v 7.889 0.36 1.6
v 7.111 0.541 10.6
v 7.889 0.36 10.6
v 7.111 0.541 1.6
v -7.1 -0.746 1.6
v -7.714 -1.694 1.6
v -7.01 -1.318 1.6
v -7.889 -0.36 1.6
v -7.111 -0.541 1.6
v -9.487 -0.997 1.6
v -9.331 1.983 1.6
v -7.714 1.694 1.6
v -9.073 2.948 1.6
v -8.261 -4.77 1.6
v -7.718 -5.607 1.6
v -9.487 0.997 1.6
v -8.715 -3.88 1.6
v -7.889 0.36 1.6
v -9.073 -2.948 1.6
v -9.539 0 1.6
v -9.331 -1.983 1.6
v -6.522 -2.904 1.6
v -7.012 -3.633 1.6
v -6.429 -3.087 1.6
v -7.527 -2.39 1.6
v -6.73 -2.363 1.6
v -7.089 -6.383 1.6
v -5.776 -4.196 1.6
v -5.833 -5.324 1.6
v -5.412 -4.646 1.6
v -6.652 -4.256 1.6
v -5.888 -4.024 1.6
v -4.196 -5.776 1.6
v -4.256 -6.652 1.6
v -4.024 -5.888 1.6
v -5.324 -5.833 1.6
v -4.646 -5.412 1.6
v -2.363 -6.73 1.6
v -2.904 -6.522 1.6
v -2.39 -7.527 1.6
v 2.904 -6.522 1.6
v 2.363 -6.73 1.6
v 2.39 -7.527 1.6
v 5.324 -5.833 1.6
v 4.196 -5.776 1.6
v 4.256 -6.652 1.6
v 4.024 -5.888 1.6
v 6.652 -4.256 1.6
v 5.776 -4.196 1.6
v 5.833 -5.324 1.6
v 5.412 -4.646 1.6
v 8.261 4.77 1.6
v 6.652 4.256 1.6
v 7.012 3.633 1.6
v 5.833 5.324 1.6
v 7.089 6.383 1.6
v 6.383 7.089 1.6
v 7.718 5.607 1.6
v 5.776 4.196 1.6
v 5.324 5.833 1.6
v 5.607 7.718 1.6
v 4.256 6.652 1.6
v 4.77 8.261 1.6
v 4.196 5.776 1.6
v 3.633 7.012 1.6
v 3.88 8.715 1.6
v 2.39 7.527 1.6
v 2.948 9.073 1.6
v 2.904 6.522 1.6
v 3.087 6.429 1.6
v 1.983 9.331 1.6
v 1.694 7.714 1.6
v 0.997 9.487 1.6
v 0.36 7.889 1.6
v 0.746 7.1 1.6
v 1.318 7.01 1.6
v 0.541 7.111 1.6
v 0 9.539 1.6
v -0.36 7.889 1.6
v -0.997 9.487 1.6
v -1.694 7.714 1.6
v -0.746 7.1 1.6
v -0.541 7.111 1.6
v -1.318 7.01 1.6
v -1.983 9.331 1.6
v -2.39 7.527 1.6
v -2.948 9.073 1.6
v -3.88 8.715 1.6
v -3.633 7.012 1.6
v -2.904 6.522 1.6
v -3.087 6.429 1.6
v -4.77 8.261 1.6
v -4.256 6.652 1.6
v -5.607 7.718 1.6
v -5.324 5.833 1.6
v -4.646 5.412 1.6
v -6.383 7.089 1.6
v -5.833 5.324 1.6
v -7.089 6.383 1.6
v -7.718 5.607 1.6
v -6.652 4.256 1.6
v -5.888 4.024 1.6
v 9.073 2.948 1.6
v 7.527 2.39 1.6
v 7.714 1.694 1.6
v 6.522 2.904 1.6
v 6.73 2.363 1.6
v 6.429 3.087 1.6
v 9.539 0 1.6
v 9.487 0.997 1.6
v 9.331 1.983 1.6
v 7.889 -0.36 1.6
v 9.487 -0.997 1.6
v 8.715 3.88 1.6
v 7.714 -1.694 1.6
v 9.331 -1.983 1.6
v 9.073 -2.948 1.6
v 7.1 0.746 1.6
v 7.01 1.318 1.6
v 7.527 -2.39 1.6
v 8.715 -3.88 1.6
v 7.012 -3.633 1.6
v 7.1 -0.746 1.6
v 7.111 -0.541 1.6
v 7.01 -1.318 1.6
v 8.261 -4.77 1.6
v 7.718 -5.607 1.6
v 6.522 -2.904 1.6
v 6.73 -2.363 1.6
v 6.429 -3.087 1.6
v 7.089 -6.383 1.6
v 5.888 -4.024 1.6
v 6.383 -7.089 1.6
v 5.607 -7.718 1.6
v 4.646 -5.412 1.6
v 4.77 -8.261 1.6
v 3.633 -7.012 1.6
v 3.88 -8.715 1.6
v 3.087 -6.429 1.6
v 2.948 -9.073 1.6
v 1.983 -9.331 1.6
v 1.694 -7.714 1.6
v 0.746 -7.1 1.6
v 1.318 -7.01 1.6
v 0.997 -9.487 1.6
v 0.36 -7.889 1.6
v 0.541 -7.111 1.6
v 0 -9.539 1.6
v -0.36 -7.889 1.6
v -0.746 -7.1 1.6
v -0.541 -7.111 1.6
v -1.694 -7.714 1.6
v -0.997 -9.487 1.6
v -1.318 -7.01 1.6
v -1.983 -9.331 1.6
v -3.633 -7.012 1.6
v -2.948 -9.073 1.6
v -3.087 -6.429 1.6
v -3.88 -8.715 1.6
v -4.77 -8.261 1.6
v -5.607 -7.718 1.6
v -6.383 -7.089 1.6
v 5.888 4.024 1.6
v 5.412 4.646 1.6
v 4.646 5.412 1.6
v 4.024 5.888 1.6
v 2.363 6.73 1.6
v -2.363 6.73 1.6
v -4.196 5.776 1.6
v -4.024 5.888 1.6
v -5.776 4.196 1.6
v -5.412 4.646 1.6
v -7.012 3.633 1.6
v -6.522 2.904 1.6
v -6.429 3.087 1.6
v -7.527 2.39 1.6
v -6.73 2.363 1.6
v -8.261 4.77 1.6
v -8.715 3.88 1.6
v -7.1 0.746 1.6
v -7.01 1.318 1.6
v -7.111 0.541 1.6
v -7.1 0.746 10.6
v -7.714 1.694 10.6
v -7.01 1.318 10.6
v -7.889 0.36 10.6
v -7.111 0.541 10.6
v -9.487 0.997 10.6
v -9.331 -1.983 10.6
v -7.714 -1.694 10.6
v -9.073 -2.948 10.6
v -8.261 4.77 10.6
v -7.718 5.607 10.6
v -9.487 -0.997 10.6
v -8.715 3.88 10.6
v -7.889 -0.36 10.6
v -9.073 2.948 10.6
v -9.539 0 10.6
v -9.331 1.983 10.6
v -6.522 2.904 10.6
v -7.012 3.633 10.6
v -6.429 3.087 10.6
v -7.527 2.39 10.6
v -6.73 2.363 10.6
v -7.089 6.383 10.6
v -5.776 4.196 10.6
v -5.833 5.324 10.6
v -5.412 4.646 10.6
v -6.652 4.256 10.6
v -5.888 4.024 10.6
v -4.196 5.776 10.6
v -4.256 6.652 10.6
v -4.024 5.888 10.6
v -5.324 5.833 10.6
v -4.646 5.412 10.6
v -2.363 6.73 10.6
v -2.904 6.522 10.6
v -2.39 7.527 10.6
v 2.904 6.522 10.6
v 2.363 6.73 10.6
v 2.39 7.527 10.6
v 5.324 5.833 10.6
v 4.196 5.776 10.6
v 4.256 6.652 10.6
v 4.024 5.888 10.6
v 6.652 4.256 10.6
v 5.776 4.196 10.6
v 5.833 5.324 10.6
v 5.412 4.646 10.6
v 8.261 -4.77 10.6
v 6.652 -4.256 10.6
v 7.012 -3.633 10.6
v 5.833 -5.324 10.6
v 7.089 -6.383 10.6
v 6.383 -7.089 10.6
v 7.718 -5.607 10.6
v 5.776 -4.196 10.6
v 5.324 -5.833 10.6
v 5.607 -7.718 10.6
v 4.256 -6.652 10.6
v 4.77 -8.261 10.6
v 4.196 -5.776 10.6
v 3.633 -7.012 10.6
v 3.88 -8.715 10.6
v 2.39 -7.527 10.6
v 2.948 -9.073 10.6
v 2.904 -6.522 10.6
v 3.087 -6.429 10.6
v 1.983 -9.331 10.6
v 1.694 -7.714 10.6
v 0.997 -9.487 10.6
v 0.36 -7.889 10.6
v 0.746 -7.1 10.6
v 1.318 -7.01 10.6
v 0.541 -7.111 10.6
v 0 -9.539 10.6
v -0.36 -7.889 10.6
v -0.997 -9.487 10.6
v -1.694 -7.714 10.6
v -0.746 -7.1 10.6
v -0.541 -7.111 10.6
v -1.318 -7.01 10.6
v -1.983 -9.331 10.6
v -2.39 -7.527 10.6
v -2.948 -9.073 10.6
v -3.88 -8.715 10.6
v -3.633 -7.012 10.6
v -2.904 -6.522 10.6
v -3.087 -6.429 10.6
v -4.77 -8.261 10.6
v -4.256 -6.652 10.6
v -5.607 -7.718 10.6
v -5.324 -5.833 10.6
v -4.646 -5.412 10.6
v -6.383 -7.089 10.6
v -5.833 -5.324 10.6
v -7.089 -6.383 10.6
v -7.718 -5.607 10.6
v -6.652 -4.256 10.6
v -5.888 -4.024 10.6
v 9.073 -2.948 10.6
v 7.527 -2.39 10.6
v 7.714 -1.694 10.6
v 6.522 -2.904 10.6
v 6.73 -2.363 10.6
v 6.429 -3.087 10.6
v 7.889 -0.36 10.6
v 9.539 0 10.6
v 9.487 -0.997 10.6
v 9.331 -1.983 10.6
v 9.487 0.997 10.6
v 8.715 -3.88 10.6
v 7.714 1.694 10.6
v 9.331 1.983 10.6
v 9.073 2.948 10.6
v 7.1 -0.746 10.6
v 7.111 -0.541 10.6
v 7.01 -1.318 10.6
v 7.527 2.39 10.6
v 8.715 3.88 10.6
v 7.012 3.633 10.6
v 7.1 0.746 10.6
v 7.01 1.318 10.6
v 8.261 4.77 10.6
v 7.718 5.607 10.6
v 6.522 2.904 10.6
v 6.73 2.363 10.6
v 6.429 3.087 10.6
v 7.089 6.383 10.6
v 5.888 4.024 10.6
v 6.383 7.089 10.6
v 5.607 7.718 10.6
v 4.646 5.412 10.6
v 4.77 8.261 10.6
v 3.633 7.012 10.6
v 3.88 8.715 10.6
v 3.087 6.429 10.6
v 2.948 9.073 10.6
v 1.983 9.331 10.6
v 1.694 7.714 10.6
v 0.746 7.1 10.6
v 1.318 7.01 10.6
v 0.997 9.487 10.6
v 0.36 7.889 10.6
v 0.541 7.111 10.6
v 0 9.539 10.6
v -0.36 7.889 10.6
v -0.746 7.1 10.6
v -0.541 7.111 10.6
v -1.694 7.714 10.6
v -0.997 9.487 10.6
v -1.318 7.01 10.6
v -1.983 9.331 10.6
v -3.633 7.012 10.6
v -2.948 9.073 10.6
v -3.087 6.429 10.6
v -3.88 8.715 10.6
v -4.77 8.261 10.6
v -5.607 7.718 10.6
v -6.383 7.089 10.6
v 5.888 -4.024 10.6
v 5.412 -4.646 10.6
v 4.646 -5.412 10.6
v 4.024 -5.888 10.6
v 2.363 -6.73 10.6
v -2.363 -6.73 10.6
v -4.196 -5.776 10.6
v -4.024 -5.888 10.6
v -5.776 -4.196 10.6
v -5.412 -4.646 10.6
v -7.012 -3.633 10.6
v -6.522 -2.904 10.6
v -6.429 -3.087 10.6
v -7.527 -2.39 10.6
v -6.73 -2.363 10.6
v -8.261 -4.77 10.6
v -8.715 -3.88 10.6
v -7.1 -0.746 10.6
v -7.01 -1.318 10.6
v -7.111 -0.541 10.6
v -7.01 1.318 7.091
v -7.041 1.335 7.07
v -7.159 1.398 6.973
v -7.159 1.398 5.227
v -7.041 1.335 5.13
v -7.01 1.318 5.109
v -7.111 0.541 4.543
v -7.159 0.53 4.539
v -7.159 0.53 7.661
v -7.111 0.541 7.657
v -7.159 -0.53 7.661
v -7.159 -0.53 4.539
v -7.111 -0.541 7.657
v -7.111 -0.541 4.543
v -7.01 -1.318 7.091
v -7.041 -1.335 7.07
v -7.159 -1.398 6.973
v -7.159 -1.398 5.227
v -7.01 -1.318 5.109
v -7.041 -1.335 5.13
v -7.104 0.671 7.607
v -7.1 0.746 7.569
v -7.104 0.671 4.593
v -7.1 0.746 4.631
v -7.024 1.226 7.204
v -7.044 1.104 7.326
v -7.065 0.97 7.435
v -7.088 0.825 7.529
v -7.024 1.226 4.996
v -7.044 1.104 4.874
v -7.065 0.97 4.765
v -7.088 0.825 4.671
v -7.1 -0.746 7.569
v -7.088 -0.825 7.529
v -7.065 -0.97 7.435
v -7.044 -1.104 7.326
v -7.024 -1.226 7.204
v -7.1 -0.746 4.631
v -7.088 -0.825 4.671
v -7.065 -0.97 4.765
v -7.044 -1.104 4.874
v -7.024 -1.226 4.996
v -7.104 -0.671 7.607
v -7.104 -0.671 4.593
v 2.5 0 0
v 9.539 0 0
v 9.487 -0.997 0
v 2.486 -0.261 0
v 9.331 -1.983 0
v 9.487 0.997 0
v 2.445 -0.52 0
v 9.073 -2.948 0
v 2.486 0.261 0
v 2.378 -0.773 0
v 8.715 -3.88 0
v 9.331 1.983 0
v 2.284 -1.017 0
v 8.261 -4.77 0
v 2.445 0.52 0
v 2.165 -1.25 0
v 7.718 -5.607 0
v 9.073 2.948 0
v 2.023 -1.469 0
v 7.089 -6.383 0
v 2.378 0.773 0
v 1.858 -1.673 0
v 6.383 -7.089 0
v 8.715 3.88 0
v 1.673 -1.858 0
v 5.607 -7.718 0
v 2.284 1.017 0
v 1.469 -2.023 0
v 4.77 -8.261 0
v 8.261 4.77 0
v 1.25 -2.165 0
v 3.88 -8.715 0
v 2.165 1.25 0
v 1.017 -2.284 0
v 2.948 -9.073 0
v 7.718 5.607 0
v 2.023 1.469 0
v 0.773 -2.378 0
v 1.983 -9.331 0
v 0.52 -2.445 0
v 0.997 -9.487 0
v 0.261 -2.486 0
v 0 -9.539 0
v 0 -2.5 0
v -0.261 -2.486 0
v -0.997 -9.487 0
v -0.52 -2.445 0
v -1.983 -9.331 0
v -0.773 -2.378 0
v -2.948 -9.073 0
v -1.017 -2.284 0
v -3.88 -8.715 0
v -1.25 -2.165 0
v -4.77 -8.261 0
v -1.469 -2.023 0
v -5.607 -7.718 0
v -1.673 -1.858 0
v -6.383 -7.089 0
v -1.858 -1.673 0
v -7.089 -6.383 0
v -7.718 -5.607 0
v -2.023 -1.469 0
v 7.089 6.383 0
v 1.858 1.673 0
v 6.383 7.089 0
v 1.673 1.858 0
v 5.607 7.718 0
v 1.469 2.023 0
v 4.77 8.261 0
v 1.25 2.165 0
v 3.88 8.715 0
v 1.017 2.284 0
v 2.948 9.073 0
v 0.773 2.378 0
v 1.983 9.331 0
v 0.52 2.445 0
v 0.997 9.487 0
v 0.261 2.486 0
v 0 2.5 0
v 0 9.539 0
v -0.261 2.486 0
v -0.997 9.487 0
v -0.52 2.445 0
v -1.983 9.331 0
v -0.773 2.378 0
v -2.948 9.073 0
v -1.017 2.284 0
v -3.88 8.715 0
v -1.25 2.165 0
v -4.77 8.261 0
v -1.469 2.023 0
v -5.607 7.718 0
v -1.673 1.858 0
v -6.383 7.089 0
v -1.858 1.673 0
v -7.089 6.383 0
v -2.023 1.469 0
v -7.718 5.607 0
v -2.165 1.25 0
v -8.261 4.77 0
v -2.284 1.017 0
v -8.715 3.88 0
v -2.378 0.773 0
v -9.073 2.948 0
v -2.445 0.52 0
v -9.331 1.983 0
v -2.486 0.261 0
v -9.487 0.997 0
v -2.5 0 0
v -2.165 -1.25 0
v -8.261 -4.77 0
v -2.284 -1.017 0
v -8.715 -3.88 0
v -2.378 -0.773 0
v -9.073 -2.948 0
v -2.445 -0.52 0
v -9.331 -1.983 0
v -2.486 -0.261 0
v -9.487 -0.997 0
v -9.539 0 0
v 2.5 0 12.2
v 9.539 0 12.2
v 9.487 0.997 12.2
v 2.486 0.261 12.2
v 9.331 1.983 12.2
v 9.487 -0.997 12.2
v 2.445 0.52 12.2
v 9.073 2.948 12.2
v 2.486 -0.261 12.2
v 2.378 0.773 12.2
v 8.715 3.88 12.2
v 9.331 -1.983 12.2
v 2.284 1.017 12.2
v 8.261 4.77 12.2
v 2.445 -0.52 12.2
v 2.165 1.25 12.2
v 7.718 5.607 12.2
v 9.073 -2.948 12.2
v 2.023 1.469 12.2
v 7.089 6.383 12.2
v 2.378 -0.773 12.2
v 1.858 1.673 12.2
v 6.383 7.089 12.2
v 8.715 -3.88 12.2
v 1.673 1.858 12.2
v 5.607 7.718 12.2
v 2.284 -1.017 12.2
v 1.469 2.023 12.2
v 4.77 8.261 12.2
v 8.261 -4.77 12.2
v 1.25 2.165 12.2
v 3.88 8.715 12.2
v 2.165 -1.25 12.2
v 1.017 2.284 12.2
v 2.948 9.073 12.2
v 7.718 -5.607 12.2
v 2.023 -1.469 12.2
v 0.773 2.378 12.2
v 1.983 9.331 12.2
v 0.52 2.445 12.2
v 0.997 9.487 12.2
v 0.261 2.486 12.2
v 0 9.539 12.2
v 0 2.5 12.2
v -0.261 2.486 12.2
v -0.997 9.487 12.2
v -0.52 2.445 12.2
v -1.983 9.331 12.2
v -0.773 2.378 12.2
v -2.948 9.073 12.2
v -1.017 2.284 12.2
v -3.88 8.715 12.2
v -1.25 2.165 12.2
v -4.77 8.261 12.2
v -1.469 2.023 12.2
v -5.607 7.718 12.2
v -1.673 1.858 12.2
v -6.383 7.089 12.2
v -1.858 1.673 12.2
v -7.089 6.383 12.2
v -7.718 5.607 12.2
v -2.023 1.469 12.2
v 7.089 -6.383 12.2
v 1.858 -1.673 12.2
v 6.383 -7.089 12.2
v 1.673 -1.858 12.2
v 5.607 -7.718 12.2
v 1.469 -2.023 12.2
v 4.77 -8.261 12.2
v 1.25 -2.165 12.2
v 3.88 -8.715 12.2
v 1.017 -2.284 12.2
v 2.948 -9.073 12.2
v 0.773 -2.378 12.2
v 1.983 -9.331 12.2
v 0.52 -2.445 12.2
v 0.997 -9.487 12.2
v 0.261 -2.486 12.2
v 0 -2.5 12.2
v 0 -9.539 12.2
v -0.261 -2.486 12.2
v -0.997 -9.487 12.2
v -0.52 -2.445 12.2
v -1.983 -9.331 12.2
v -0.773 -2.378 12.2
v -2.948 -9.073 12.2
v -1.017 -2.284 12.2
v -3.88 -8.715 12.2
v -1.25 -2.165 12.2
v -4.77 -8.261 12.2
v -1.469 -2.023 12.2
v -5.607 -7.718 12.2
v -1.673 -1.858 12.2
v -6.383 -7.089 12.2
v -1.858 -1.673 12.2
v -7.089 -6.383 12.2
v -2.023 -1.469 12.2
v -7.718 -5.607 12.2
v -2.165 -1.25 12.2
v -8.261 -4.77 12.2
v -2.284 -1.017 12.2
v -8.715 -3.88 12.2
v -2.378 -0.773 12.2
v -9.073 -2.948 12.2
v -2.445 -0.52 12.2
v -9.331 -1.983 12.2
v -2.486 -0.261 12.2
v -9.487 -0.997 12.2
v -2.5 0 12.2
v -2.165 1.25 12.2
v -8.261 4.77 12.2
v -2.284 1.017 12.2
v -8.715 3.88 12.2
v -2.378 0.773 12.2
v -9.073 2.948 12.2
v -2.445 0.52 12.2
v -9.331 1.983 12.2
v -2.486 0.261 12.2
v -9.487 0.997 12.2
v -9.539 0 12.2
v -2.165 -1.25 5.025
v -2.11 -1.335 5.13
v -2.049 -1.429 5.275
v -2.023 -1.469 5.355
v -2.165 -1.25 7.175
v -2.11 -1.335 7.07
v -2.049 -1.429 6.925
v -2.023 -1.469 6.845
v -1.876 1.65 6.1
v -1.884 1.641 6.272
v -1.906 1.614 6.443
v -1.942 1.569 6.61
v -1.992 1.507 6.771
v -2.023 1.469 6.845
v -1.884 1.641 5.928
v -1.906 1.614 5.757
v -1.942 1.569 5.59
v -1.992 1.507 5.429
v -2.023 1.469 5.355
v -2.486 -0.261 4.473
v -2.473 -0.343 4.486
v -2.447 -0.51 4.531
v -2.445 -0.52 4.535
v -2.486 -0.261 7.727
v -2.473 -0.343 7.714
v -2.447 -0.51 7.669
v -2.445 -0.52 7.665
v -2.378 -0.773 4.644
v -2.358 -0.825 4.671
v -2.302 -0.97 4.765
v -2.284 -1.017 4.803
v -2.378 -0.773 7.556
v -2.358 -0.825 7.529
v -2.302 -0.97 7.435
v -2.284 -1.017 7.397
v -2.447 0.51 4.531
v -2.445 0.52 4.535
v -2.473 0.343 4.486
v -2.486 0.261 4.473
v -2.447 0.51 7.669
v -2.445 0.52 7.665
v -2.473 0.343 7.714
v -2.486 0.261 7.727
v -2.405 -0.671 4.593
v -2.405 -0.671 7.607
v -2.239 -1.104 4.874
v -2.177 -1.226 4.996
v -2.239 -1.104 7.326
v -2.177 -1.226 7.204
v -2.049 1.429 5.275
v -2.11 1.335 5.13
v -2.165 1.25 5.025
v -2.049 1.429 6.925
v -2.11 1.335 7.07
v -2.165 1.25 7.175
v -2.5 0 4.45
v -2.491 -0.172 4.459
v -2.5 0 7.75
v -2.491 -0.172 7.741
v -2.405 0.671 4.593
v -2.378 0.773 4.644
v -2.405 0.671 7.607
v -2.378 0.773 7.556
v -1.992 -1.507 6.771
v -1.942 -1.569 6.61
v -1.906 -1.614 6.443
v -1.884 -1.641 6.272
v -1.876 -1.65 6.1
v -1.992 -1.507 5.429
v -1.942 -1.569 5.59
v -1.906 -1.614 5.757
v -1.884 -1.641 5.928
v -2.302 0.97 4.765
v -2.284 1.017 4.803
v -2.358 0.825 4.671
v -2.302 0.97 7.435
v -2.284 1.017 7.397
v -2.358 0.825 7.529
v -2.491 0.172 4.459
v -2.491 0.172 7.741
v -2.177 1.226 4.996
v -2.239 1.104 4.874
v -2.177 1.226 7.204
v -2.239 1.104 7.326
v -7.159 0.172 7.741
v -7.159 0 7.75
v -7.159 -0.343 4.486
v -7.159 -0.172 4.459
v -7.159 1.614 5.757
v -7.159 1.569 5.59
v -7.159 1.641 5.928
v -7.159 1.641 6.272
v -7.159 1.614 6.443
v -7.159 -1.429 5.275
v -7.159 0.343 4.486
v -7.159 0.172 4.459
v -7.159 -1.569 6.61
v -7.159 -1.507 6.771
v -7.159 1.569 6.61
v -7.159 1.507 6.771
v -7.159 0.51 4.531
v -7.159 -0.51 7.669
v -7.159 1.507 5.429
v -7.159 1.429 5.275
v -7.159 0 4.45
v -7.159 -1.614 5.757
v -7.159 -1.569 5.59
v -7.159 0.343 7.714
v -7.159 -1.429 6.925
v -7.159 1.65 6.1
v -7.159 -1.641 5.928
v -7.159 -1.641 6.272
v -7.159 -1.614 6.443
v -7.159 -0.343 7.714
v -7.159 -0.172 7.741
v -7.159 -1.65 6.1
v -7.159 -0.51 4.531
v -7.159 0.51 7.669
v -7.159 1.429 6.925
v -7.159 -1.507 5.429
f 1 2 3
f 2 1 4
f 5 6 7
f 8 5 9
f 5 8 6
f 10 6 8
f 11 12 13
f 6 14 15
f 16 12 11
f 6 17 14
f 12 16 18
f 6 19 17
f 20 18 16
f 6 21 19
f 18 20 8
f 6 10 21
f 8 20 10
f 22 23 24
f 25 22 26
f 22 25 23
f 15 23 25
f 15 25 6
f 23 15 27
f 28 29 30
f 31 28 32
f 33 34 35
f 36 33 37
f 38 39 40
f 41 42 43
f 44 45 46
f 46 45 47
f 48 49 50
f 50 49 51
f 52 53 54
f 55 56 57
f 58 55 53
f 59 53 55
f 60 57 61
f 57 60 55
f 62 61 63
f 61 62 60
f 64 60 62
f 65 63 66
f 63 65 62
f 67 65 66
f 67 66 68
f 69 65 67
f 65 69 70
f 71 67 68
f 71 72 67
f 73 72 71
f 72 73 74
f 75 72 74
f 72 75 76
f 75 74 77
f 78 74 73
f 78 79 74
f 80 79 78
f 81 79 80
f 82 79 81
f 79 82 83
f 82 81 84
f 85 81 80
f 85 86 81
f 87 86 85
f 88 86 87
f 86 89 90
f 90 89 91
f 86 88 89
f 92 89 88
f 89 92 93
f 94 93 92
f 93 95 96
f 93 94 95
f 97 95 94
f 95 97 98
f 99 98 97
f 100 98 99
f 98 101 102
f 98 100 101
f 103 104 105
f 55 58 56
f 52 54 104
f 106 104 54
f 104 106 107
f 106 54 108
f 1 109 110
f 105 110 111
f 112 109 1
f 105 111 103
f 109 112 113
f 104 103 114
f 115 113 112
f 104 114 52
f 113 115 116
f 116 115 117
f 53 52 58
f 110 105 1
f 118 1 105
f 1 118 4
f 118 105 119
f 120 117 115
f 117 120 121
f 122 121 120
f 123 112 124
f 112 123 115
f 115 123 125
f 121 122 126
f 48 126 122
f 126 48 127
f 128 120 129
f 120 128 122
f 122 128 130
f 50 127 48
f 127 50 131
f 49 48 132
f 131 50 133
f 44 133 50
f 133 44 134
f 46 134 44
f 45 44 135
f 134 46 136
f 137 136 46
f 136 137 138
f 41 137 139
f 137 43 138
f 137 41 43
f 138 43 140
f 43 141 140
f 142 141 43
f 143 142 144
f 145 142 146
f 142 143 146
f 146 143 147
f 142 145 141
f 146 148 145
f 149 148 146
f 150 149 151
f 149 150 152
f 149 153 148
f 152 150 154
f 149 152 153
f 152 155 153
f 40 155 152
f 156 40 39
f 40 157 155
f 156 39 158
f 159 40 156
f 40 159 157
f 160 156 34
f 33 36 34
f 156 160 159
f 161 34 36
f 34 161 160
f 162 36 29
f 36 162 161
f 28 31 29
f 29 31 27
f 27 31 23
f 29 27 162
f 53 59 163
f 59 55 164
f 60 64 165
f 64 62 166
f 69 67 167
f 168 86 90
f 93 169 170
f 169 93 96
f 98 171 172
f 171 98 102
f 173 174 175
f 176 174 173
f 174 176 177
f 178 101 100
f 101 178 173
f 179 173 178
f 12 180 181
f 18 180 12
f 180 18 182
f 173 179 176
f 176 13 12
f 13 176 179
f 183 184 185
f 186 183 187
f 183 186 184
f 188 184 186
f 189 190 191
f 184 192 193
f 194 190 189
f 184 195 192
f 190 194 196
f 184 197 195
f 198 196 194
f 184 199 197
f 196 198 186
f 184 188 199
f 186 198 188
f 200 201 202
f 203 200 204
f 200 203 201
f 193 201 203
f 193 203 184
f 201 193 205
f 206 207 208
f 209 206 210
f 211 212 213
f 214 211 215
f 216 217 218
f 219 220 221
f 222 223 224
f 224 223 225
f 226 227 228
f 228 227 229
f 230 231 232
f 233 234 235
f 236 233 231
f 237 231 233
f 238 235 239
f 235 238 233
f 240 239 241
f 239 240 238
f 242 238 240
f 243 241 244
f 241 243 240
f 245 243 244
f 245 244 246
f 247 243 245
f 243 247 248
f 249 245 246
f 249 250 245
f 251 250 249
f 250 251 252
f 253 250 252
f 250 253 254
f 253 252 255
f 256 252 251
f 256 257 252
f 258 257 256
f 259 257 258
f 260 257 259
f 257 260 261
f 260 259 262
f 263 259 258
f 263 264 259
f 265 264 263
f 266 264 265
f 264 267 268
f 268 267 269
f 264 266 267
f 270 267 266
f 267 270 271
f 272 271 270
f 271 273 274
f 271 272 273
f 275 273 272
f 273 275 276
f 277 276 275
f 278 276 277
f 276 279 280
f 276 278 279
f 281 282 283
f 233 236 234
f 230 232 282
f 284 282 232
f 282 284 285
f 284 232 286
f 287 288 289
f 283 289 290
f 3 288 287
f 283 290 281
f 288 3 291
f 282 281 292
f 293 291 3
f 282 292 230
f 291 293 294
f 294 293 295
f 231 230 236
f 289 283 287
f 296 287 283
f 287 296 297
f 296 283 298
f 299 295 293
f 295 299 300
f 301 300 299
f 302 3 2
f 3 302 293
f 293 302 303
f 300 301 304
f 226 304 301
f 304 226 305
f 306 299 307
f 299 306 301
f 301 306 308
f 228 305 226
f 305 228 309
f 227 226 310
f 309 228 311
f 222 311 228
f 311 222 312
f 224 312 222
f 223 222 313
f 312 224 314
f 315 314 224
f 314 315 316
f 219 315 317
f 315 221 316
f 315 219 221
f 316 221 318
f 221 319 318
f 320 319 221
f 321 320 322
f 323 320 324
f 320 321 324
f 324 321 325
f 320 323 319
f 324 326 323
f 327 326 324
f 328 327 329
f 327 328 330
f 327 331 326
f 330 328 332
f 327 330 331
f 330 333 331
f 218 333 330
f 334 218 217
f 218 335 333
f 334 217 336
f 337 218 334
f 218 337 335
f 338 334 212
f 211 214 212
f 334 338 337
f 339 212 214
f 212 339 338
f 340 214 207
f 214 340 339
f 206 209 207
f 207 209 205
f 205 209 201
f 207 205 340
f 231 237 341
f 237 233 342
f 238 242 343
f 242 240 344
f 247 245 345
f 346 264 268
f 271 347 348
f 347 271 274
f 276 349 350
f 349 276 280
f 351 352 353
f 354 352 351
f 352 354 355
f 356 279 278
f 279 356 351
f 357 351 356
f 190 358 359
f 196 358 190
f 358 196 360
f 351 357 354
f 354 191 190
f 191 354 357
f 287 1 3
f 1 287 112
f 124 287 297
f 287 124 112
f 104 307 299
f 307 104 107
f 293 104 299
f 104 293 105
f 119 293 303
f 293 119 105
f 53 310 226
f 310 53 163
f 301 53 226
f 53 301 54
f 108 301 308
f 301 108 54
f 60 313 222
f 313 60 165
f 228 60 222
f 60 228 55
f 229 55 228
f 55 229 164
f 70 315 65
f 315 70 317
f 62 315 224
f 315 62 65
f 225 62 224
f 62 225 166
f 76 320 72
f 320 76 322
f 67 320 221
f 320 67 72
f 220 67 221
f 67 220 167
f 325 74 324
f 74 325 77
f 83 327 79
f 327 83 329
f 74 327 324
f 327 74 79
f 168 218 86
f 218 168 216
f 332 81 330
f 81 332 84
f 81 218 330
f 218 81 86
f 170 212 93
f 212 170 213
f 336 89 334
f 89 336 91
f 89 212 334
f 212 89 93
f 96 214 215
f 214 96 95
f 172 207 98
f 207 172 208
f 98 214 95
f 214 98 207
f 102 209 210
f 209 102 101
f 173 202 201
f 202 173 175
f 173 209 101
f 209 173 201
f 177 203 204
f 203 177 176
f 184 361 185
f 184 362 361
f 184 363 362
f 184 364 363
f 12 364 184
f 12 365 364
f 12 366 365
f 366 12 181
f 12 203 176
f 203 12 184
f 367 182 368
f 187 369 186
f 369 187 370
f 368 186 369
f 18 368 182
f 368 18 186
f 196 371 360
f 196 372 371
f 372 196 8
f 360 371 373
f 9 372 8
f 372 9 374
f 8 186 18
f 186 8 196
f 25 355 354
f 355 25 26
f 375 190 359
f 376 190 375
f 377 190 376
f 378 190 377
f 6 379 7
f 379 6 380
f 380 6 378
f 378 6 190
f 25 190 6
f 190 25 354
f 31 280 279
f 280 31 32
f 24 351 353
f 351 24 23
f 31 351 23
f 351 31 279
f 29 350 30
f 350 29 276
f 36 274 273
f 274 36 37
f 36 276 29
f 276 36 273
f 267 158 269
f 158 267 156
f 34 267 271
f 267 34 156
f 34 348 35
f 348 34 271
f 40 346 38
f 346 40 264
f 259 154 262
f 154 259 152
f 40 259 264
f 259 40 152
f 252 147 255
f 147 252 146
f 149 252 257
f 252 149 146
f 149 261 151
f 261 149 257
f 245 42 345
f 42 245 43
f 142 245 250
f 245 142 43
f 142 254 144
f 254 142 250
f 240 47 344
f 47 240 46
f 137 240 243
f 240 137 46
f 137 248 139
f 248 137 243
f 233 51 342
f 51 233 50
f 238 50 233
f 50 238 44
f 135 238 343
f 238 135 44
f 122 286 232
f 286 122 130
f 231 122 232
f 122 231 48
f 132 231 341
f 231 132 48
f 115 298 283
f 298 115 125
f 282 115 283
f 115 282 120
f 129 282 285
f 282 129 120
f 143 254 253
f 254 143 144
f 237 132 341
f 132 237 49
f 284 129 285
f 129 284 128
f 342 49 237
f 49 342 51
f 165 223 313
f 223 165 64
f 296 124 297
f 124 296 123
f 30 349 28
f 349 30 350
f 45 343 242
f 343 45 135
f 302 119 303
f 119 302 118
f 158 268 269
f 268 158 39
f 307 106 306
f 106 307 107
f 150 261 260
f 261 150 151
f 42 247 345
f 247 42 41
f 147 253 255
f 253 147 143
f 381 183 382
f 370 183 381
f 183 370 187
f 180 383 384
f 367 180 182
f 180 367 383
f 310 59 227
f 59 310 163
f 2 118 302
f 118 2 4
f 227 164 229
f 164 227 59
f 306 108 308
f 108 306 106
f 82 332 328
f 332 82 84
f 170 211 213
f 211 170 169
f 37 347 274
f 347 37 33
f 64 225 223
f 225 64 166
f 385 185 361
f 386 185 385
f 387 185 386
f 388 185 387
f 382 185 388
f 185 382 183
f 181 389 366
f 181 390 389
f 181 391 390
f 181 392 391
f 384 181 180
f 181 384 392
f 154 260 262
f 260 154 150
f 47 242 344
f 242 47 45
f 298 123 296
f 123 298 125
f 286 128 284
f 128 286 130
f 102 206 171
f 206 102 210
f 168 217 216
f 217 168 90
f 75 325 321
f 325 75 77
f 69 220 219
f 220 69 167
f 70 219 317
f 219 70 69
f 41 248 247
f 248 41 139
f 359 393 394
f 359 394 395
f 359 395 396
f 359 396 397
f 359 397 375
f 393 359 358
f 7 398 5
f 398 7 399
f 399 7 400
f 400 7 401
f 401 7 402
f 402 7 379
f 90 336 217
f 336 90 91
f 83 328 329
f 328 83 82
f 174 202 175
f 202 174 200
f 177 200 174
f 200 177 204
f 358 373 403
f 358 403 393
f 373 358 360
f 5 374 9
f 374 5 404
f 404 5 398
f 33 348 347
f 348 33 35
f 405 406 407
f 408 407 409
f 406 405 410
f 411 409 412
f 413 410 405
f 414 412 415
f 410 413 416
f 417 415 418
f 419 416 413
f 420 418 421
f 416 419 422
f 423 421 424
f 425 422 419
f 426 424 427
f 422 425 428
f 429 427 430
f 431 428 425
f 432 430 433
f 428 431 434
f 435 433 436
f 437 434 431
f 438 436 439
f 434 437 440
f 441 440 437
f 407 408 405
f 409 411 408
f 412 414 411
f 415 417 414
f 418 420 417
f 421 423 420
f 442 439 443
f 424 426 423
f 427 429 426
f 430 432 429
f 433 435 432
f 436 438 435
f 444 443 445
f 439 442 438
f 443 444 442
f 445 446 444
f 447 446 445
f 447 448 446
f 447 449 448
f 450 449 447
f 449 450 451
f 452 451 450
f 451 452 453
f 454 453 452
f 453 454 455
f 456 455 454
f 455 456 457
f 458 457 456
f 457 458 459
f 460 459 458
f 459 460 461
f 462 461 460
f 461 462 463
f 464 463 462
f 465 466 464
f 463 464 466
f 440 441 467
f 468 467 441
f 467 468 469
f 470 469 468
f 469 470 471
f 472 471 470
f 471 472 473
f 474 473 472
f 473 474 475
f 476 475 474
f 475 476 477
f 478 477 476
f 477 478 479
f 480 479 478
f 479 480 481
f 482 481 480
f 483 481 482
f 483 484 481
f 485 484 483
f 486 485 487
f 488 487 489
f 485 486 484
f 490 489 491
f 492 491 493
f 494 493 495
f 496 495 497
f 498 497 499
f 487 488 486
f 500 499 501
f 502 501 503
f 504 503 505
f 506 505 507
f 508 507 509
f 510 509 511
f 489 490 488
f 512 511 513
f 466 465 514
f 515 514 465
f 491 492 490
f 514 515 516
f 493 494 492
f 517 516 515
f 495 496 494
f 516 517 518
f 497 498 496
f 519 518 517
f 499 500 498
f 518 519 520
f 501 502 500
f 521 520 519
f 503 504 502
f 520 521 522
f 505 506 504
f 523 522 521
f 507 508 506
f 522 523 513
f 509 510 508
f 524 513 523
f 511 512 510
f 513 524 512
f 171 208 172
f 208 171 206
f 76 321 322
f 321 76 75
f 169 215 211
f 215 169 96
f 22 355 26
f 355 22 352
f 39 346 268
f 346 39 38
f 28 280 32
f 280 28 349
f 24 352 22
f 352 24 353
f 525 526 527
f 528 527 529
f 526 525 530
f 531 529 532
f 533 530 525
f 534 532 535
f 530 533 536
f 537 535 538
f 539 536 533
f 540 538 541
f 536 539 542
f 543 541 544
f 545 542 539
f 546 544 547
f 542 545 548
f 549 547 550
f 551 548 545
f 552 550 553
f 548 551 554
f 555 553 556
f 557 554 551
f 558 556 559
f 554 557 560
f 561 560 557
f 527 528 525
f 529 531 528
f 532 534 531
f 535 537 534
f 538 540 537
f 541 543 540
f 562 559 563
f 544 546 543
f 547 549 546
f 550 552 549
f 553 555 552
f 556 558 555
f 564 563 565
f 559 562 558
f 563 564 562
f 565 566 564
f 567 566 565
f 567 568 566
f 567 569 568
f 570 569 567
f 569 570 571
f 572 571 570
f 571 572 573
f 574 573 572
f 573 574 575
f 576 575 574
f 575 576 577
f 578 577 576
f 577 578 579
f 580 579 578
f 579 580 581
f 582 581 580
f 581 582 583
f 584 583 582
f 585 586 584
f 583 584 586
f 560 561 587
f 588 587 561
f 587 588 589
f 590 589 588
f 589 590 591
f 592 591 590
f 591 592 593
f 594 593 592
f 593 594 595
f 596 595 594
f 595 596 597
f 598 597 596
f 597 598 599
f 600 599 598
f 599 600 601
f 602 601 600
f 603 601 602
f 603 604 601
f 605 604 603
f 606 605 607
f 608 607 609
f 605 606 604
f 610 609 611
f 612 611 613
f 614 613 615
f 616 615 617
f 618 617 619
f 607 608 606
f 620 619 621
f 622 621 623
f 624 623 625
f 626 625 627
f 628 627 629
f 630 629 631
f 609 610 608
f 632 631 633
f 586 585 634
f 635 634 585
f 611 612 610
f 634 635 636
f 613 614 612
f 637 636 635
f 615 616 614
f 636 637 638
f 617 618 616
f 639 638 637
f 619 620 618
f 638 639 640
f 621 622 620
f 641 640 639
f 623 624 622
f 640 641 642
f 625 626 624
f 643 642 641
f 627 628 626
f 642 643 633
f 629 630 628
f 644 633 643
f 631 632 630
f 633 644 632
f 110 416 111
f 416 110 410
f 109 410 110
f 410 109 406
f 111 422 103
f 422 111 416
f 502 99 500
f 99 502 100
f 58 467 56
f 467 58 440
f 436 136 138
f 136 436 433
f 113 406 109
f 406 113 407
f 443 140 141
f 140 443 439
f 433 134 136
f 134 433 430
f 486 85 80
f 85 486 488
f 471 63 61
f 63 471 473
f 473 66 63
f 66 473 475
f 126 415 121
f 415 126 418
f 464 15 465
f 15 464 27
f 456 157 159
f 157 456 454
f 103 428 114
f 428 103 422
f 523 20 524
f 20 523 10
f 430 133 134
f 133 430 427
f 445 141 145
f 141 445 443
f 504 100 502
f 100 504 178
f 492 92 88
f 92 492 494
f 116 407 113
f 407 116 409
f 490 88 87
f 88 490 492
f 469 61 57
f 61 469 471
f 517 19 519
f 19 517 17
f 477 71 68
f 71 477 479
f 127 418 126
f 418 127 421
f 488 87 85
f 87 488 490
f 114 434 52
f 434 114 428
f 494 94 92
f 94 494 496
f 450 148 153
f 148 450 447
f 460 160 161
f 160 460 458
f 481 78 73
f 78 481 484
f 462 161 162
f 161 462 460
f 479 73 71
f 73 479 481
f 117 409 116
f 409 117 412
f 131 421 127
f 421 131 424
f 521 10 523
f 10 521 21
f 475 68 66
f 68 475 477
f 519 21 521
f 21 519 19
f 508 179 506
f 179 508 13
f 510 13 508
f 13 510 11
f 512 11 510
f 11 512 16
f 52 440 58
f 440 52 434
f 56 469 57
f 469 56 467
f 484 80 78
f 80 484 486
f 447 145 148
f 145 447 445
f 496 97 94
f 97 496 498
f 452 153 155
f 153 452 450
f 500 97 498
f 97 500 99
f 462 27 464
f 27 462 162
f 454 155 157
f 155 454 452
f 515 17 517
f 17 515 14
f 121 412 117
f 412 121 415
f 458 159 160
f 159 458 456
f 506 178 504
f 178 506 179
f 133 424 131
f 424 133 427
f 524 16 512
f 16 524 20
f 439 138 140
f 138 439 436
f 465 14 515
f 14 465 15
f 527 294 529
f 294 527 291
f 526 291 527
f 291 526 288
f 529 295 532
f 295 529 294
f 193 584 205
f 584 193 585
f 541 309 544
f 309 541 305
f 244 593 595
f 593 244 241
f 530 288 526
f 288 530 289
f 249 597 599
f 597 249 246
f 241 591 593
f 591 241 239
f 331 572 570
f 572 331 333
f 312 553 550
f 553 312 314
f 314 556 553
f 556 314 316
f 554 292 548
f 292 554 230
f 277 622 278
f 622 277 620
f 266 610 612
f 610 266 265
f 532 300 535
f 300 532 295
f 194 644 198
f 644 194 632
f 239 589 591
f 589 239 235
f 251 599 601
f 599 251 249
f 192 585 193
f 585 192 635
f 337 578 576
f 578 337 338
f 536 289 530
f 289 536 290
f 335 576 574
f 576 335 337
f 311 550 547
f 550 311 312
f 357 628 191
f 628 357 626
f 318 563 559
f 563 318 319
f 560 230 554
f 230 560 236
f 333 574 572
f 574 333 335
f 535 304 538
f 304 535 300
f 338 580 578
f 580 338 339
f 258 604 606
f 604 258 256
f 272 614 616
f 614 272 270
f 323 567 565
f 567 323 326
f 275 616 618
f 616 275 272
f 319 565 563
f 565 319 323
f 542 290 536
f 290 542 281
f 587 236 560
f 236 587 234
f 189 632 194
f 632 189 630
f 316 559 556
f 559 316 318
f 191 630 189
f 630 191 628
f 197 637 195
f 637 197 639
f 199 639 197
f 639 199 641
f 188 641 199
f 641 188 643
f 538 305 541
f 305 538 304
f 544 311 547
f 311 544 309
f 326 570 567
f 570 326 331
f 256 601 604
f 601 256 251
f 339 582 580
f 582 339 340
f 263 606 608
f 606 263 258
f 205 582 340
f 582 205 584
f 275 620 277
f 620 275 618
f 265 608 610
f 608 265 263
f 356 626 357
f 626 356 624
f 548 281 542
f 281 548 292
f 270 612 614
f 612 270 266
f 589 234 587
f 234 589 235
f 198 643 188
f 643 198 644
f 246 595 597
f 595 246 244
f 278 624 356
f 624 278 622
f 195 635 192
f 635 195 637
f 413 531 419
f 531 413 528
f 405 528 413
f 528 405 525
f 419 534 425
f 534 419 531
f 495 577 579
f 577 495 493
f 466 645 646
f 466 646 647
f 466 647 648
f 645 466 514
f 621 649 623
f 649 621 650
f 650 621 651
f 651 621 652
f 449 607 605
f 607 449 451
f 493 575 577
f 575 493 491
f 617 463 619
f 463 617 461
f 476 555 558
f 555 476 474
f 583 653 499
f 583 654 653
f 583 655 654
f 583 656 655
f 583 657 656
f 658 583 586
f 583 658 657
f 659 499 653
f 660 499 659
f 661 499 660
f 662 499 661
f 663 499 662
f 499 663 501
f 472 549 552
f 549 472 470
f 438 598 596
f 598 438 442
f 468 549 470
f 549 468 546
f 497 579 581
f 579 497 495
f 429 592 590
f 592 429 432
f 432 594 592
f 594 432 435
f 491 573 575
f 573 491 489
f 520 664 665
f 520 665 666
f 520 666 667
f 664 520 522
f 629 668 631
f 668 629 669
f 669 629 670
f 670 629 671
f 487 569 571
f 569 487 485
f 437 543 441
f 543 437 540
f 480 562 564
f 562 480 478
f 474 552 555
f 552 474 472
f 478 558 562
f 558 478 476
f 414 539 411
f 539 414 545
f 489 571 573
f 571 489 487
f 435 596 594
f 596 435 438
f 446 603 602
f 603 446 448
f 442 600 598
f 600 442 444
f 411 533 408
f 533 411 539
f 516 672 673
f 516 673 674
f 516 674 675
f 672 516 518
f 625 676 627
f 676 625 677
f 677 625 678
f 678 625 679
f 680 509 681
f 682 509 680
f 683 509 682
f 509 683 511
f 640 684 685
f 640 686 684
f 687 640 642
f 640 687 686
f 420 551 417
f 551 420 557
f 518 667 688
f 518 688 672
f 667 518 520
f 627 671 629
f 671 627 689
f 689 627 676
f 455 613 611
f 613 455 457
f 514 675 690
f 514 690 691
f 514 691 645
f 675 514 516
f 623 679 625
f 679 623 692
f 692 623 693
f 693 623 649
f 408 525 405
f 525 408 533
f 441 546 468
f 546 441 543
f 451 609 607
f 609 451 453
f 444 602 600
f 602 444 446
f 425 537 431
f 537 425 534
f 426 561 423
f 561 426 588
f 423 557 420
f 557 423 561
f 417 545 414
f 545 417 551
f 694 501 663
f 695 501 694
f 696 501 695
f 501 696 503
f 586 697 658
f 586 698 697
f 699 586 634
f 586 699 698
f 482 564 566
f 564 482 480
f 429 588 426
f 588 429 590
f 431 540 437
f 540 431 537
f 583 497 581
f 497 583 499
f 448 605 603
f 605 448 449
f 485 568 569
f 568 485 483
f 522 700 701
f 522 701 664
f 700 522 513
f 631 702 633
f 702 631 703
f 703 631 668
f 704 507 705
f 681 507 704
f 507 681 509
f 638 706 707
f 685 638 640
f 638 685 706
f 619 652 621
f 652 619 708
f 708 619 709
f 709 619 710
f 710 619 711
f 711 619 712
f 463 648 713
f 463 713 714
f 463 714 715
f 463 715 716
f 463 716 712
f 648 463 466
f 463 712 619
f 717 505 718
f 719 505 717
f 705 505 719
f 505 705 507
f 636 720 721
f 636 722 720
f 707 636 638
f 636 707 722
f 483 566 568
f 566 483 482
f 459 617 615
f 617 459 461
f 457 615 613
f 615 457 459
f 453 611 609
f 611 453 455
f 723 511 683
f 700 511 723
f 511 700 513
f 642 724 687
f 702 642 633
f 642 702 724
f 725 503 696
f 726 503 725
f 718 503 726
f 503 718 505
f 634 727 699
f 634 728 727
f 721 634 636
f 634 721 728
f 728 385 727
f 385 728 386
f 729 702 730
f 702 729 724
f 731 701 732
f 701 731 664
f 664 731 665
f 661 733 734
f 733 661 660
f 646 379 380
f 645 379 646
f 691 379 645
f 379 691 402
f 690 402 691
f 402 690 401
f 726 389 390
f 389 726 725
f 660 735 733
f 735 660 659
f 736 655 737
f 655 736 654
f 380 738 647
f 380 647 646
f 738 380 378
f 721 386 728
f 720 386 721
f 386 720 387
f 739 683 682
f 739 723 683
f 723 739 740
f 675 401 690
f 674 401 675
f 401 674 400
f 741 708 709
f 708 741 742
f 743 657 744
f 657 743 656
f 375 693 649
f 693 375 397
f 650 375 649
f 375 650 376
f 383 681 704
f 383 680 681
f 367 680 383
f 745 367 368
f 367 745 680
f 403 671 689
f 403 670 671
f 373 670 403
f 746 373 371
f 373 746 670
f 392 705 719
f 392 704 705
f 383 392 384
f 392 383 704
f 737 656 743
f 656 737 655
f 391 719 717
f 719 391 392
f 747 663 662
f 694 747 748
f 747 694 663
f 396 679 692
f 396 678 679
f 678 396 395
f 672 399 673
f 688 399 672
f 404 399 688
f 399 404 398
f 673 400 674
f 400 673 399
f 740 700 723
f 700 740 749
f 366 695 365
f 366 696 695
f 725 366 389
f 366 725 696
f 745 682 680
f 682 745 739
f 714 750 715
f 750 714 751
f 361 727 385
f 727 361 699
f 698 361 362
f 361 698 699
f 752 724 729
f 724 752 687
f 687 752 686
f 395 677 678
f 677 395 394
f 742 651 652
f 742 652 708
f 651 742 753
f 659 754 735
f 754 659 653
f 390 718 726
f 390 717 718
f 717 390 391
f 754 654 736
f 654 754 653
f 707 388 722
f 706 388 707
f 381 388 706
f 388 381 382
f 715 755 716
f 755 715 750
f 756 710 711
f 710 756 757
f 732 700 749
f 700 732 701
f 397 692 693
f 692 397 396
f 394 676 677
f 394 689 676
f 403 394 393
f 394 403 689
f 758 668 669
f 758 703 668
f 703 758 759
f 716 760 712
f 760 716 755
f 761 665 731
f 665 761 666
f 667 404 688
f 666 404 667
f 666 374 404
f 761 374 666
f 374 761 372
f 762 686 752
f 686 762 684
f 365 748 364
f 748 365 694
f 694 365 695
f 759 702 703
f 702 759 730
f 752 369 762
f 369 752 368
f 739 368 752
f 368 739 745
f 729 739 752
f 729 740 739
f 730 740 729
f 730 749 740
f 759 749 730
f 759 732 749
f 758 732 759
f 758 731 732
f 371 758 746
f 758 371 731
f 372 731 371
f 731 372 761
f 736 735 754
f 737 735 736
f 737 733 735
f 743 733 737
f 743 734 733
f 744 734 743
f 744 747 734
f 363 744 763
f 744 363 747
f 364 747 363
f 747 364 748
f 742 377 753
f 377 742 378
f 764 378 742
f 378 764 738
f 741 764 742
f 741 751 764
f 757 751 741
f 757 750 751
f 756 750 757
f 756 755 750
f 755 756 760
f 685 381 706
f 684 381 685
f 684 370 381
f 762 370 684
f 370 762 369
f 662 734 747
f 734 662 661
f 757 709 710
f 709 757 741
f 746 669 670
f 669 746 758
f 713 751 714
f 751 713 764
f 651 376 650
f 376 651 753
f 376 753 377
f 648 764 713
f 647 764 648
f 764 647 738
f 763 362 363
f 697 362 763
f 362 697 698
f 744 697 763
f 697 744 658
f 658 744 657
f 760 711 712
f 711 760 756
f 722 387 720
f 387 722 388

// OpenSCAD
// GT2 pulley, 24 teeth for 9 mm belt.
$fn = 60;
eps = 0.02;
teeth = 24;
belt_pitch = 2;
belt_w = 9;
shaft_d = 5;
set_screw_d = 3.3;
tooth_depth = 0.75;
tooth_overlap = 0.28;
tooth_base_w = 1.2;
tooth_tip_w = 0.72;
flange_t = 1.6;
core_d = teeth * belt_pitch / PI - 1.0;
body_h = belt_w + 2 * flange_t;
module tooth() {
    linear_extrude(height = belt_w)
        polygon(points = [[-tooth_overlap, -tooth_base_w / 2], [tooth_depth, -tooth_tip_w / 2], [tooth_depth, tooth_tip_w / 2], [-tooth_overlap, tooth_base_w / 2]]);
}
difference() {
    union() {
        cylinder(d = core_d, h = body_h);
        cylinder(d = core_d + 4.8, h = flange_t);
        translate([0, 0, body_h - flange_t]) cylinder(d = core_d + 4.8, h = flange_t);
        for (i = [0 : teeth - 1]) rotate([0, 0, i * 360 / teeth]) translate([core_d / 2, 0, flange_t]) tooth();
    }
    translate([0, 0, -eps]) cylinder(d = shaft_d, h = body_h + 2 * eps);
    translate([-core_d / 2 - eps, 0, body_h / 2]) rotate([0, 90, 0]) cylinder(d = set_screw_d, h = core_d / 2 + 2 * eps);
}
